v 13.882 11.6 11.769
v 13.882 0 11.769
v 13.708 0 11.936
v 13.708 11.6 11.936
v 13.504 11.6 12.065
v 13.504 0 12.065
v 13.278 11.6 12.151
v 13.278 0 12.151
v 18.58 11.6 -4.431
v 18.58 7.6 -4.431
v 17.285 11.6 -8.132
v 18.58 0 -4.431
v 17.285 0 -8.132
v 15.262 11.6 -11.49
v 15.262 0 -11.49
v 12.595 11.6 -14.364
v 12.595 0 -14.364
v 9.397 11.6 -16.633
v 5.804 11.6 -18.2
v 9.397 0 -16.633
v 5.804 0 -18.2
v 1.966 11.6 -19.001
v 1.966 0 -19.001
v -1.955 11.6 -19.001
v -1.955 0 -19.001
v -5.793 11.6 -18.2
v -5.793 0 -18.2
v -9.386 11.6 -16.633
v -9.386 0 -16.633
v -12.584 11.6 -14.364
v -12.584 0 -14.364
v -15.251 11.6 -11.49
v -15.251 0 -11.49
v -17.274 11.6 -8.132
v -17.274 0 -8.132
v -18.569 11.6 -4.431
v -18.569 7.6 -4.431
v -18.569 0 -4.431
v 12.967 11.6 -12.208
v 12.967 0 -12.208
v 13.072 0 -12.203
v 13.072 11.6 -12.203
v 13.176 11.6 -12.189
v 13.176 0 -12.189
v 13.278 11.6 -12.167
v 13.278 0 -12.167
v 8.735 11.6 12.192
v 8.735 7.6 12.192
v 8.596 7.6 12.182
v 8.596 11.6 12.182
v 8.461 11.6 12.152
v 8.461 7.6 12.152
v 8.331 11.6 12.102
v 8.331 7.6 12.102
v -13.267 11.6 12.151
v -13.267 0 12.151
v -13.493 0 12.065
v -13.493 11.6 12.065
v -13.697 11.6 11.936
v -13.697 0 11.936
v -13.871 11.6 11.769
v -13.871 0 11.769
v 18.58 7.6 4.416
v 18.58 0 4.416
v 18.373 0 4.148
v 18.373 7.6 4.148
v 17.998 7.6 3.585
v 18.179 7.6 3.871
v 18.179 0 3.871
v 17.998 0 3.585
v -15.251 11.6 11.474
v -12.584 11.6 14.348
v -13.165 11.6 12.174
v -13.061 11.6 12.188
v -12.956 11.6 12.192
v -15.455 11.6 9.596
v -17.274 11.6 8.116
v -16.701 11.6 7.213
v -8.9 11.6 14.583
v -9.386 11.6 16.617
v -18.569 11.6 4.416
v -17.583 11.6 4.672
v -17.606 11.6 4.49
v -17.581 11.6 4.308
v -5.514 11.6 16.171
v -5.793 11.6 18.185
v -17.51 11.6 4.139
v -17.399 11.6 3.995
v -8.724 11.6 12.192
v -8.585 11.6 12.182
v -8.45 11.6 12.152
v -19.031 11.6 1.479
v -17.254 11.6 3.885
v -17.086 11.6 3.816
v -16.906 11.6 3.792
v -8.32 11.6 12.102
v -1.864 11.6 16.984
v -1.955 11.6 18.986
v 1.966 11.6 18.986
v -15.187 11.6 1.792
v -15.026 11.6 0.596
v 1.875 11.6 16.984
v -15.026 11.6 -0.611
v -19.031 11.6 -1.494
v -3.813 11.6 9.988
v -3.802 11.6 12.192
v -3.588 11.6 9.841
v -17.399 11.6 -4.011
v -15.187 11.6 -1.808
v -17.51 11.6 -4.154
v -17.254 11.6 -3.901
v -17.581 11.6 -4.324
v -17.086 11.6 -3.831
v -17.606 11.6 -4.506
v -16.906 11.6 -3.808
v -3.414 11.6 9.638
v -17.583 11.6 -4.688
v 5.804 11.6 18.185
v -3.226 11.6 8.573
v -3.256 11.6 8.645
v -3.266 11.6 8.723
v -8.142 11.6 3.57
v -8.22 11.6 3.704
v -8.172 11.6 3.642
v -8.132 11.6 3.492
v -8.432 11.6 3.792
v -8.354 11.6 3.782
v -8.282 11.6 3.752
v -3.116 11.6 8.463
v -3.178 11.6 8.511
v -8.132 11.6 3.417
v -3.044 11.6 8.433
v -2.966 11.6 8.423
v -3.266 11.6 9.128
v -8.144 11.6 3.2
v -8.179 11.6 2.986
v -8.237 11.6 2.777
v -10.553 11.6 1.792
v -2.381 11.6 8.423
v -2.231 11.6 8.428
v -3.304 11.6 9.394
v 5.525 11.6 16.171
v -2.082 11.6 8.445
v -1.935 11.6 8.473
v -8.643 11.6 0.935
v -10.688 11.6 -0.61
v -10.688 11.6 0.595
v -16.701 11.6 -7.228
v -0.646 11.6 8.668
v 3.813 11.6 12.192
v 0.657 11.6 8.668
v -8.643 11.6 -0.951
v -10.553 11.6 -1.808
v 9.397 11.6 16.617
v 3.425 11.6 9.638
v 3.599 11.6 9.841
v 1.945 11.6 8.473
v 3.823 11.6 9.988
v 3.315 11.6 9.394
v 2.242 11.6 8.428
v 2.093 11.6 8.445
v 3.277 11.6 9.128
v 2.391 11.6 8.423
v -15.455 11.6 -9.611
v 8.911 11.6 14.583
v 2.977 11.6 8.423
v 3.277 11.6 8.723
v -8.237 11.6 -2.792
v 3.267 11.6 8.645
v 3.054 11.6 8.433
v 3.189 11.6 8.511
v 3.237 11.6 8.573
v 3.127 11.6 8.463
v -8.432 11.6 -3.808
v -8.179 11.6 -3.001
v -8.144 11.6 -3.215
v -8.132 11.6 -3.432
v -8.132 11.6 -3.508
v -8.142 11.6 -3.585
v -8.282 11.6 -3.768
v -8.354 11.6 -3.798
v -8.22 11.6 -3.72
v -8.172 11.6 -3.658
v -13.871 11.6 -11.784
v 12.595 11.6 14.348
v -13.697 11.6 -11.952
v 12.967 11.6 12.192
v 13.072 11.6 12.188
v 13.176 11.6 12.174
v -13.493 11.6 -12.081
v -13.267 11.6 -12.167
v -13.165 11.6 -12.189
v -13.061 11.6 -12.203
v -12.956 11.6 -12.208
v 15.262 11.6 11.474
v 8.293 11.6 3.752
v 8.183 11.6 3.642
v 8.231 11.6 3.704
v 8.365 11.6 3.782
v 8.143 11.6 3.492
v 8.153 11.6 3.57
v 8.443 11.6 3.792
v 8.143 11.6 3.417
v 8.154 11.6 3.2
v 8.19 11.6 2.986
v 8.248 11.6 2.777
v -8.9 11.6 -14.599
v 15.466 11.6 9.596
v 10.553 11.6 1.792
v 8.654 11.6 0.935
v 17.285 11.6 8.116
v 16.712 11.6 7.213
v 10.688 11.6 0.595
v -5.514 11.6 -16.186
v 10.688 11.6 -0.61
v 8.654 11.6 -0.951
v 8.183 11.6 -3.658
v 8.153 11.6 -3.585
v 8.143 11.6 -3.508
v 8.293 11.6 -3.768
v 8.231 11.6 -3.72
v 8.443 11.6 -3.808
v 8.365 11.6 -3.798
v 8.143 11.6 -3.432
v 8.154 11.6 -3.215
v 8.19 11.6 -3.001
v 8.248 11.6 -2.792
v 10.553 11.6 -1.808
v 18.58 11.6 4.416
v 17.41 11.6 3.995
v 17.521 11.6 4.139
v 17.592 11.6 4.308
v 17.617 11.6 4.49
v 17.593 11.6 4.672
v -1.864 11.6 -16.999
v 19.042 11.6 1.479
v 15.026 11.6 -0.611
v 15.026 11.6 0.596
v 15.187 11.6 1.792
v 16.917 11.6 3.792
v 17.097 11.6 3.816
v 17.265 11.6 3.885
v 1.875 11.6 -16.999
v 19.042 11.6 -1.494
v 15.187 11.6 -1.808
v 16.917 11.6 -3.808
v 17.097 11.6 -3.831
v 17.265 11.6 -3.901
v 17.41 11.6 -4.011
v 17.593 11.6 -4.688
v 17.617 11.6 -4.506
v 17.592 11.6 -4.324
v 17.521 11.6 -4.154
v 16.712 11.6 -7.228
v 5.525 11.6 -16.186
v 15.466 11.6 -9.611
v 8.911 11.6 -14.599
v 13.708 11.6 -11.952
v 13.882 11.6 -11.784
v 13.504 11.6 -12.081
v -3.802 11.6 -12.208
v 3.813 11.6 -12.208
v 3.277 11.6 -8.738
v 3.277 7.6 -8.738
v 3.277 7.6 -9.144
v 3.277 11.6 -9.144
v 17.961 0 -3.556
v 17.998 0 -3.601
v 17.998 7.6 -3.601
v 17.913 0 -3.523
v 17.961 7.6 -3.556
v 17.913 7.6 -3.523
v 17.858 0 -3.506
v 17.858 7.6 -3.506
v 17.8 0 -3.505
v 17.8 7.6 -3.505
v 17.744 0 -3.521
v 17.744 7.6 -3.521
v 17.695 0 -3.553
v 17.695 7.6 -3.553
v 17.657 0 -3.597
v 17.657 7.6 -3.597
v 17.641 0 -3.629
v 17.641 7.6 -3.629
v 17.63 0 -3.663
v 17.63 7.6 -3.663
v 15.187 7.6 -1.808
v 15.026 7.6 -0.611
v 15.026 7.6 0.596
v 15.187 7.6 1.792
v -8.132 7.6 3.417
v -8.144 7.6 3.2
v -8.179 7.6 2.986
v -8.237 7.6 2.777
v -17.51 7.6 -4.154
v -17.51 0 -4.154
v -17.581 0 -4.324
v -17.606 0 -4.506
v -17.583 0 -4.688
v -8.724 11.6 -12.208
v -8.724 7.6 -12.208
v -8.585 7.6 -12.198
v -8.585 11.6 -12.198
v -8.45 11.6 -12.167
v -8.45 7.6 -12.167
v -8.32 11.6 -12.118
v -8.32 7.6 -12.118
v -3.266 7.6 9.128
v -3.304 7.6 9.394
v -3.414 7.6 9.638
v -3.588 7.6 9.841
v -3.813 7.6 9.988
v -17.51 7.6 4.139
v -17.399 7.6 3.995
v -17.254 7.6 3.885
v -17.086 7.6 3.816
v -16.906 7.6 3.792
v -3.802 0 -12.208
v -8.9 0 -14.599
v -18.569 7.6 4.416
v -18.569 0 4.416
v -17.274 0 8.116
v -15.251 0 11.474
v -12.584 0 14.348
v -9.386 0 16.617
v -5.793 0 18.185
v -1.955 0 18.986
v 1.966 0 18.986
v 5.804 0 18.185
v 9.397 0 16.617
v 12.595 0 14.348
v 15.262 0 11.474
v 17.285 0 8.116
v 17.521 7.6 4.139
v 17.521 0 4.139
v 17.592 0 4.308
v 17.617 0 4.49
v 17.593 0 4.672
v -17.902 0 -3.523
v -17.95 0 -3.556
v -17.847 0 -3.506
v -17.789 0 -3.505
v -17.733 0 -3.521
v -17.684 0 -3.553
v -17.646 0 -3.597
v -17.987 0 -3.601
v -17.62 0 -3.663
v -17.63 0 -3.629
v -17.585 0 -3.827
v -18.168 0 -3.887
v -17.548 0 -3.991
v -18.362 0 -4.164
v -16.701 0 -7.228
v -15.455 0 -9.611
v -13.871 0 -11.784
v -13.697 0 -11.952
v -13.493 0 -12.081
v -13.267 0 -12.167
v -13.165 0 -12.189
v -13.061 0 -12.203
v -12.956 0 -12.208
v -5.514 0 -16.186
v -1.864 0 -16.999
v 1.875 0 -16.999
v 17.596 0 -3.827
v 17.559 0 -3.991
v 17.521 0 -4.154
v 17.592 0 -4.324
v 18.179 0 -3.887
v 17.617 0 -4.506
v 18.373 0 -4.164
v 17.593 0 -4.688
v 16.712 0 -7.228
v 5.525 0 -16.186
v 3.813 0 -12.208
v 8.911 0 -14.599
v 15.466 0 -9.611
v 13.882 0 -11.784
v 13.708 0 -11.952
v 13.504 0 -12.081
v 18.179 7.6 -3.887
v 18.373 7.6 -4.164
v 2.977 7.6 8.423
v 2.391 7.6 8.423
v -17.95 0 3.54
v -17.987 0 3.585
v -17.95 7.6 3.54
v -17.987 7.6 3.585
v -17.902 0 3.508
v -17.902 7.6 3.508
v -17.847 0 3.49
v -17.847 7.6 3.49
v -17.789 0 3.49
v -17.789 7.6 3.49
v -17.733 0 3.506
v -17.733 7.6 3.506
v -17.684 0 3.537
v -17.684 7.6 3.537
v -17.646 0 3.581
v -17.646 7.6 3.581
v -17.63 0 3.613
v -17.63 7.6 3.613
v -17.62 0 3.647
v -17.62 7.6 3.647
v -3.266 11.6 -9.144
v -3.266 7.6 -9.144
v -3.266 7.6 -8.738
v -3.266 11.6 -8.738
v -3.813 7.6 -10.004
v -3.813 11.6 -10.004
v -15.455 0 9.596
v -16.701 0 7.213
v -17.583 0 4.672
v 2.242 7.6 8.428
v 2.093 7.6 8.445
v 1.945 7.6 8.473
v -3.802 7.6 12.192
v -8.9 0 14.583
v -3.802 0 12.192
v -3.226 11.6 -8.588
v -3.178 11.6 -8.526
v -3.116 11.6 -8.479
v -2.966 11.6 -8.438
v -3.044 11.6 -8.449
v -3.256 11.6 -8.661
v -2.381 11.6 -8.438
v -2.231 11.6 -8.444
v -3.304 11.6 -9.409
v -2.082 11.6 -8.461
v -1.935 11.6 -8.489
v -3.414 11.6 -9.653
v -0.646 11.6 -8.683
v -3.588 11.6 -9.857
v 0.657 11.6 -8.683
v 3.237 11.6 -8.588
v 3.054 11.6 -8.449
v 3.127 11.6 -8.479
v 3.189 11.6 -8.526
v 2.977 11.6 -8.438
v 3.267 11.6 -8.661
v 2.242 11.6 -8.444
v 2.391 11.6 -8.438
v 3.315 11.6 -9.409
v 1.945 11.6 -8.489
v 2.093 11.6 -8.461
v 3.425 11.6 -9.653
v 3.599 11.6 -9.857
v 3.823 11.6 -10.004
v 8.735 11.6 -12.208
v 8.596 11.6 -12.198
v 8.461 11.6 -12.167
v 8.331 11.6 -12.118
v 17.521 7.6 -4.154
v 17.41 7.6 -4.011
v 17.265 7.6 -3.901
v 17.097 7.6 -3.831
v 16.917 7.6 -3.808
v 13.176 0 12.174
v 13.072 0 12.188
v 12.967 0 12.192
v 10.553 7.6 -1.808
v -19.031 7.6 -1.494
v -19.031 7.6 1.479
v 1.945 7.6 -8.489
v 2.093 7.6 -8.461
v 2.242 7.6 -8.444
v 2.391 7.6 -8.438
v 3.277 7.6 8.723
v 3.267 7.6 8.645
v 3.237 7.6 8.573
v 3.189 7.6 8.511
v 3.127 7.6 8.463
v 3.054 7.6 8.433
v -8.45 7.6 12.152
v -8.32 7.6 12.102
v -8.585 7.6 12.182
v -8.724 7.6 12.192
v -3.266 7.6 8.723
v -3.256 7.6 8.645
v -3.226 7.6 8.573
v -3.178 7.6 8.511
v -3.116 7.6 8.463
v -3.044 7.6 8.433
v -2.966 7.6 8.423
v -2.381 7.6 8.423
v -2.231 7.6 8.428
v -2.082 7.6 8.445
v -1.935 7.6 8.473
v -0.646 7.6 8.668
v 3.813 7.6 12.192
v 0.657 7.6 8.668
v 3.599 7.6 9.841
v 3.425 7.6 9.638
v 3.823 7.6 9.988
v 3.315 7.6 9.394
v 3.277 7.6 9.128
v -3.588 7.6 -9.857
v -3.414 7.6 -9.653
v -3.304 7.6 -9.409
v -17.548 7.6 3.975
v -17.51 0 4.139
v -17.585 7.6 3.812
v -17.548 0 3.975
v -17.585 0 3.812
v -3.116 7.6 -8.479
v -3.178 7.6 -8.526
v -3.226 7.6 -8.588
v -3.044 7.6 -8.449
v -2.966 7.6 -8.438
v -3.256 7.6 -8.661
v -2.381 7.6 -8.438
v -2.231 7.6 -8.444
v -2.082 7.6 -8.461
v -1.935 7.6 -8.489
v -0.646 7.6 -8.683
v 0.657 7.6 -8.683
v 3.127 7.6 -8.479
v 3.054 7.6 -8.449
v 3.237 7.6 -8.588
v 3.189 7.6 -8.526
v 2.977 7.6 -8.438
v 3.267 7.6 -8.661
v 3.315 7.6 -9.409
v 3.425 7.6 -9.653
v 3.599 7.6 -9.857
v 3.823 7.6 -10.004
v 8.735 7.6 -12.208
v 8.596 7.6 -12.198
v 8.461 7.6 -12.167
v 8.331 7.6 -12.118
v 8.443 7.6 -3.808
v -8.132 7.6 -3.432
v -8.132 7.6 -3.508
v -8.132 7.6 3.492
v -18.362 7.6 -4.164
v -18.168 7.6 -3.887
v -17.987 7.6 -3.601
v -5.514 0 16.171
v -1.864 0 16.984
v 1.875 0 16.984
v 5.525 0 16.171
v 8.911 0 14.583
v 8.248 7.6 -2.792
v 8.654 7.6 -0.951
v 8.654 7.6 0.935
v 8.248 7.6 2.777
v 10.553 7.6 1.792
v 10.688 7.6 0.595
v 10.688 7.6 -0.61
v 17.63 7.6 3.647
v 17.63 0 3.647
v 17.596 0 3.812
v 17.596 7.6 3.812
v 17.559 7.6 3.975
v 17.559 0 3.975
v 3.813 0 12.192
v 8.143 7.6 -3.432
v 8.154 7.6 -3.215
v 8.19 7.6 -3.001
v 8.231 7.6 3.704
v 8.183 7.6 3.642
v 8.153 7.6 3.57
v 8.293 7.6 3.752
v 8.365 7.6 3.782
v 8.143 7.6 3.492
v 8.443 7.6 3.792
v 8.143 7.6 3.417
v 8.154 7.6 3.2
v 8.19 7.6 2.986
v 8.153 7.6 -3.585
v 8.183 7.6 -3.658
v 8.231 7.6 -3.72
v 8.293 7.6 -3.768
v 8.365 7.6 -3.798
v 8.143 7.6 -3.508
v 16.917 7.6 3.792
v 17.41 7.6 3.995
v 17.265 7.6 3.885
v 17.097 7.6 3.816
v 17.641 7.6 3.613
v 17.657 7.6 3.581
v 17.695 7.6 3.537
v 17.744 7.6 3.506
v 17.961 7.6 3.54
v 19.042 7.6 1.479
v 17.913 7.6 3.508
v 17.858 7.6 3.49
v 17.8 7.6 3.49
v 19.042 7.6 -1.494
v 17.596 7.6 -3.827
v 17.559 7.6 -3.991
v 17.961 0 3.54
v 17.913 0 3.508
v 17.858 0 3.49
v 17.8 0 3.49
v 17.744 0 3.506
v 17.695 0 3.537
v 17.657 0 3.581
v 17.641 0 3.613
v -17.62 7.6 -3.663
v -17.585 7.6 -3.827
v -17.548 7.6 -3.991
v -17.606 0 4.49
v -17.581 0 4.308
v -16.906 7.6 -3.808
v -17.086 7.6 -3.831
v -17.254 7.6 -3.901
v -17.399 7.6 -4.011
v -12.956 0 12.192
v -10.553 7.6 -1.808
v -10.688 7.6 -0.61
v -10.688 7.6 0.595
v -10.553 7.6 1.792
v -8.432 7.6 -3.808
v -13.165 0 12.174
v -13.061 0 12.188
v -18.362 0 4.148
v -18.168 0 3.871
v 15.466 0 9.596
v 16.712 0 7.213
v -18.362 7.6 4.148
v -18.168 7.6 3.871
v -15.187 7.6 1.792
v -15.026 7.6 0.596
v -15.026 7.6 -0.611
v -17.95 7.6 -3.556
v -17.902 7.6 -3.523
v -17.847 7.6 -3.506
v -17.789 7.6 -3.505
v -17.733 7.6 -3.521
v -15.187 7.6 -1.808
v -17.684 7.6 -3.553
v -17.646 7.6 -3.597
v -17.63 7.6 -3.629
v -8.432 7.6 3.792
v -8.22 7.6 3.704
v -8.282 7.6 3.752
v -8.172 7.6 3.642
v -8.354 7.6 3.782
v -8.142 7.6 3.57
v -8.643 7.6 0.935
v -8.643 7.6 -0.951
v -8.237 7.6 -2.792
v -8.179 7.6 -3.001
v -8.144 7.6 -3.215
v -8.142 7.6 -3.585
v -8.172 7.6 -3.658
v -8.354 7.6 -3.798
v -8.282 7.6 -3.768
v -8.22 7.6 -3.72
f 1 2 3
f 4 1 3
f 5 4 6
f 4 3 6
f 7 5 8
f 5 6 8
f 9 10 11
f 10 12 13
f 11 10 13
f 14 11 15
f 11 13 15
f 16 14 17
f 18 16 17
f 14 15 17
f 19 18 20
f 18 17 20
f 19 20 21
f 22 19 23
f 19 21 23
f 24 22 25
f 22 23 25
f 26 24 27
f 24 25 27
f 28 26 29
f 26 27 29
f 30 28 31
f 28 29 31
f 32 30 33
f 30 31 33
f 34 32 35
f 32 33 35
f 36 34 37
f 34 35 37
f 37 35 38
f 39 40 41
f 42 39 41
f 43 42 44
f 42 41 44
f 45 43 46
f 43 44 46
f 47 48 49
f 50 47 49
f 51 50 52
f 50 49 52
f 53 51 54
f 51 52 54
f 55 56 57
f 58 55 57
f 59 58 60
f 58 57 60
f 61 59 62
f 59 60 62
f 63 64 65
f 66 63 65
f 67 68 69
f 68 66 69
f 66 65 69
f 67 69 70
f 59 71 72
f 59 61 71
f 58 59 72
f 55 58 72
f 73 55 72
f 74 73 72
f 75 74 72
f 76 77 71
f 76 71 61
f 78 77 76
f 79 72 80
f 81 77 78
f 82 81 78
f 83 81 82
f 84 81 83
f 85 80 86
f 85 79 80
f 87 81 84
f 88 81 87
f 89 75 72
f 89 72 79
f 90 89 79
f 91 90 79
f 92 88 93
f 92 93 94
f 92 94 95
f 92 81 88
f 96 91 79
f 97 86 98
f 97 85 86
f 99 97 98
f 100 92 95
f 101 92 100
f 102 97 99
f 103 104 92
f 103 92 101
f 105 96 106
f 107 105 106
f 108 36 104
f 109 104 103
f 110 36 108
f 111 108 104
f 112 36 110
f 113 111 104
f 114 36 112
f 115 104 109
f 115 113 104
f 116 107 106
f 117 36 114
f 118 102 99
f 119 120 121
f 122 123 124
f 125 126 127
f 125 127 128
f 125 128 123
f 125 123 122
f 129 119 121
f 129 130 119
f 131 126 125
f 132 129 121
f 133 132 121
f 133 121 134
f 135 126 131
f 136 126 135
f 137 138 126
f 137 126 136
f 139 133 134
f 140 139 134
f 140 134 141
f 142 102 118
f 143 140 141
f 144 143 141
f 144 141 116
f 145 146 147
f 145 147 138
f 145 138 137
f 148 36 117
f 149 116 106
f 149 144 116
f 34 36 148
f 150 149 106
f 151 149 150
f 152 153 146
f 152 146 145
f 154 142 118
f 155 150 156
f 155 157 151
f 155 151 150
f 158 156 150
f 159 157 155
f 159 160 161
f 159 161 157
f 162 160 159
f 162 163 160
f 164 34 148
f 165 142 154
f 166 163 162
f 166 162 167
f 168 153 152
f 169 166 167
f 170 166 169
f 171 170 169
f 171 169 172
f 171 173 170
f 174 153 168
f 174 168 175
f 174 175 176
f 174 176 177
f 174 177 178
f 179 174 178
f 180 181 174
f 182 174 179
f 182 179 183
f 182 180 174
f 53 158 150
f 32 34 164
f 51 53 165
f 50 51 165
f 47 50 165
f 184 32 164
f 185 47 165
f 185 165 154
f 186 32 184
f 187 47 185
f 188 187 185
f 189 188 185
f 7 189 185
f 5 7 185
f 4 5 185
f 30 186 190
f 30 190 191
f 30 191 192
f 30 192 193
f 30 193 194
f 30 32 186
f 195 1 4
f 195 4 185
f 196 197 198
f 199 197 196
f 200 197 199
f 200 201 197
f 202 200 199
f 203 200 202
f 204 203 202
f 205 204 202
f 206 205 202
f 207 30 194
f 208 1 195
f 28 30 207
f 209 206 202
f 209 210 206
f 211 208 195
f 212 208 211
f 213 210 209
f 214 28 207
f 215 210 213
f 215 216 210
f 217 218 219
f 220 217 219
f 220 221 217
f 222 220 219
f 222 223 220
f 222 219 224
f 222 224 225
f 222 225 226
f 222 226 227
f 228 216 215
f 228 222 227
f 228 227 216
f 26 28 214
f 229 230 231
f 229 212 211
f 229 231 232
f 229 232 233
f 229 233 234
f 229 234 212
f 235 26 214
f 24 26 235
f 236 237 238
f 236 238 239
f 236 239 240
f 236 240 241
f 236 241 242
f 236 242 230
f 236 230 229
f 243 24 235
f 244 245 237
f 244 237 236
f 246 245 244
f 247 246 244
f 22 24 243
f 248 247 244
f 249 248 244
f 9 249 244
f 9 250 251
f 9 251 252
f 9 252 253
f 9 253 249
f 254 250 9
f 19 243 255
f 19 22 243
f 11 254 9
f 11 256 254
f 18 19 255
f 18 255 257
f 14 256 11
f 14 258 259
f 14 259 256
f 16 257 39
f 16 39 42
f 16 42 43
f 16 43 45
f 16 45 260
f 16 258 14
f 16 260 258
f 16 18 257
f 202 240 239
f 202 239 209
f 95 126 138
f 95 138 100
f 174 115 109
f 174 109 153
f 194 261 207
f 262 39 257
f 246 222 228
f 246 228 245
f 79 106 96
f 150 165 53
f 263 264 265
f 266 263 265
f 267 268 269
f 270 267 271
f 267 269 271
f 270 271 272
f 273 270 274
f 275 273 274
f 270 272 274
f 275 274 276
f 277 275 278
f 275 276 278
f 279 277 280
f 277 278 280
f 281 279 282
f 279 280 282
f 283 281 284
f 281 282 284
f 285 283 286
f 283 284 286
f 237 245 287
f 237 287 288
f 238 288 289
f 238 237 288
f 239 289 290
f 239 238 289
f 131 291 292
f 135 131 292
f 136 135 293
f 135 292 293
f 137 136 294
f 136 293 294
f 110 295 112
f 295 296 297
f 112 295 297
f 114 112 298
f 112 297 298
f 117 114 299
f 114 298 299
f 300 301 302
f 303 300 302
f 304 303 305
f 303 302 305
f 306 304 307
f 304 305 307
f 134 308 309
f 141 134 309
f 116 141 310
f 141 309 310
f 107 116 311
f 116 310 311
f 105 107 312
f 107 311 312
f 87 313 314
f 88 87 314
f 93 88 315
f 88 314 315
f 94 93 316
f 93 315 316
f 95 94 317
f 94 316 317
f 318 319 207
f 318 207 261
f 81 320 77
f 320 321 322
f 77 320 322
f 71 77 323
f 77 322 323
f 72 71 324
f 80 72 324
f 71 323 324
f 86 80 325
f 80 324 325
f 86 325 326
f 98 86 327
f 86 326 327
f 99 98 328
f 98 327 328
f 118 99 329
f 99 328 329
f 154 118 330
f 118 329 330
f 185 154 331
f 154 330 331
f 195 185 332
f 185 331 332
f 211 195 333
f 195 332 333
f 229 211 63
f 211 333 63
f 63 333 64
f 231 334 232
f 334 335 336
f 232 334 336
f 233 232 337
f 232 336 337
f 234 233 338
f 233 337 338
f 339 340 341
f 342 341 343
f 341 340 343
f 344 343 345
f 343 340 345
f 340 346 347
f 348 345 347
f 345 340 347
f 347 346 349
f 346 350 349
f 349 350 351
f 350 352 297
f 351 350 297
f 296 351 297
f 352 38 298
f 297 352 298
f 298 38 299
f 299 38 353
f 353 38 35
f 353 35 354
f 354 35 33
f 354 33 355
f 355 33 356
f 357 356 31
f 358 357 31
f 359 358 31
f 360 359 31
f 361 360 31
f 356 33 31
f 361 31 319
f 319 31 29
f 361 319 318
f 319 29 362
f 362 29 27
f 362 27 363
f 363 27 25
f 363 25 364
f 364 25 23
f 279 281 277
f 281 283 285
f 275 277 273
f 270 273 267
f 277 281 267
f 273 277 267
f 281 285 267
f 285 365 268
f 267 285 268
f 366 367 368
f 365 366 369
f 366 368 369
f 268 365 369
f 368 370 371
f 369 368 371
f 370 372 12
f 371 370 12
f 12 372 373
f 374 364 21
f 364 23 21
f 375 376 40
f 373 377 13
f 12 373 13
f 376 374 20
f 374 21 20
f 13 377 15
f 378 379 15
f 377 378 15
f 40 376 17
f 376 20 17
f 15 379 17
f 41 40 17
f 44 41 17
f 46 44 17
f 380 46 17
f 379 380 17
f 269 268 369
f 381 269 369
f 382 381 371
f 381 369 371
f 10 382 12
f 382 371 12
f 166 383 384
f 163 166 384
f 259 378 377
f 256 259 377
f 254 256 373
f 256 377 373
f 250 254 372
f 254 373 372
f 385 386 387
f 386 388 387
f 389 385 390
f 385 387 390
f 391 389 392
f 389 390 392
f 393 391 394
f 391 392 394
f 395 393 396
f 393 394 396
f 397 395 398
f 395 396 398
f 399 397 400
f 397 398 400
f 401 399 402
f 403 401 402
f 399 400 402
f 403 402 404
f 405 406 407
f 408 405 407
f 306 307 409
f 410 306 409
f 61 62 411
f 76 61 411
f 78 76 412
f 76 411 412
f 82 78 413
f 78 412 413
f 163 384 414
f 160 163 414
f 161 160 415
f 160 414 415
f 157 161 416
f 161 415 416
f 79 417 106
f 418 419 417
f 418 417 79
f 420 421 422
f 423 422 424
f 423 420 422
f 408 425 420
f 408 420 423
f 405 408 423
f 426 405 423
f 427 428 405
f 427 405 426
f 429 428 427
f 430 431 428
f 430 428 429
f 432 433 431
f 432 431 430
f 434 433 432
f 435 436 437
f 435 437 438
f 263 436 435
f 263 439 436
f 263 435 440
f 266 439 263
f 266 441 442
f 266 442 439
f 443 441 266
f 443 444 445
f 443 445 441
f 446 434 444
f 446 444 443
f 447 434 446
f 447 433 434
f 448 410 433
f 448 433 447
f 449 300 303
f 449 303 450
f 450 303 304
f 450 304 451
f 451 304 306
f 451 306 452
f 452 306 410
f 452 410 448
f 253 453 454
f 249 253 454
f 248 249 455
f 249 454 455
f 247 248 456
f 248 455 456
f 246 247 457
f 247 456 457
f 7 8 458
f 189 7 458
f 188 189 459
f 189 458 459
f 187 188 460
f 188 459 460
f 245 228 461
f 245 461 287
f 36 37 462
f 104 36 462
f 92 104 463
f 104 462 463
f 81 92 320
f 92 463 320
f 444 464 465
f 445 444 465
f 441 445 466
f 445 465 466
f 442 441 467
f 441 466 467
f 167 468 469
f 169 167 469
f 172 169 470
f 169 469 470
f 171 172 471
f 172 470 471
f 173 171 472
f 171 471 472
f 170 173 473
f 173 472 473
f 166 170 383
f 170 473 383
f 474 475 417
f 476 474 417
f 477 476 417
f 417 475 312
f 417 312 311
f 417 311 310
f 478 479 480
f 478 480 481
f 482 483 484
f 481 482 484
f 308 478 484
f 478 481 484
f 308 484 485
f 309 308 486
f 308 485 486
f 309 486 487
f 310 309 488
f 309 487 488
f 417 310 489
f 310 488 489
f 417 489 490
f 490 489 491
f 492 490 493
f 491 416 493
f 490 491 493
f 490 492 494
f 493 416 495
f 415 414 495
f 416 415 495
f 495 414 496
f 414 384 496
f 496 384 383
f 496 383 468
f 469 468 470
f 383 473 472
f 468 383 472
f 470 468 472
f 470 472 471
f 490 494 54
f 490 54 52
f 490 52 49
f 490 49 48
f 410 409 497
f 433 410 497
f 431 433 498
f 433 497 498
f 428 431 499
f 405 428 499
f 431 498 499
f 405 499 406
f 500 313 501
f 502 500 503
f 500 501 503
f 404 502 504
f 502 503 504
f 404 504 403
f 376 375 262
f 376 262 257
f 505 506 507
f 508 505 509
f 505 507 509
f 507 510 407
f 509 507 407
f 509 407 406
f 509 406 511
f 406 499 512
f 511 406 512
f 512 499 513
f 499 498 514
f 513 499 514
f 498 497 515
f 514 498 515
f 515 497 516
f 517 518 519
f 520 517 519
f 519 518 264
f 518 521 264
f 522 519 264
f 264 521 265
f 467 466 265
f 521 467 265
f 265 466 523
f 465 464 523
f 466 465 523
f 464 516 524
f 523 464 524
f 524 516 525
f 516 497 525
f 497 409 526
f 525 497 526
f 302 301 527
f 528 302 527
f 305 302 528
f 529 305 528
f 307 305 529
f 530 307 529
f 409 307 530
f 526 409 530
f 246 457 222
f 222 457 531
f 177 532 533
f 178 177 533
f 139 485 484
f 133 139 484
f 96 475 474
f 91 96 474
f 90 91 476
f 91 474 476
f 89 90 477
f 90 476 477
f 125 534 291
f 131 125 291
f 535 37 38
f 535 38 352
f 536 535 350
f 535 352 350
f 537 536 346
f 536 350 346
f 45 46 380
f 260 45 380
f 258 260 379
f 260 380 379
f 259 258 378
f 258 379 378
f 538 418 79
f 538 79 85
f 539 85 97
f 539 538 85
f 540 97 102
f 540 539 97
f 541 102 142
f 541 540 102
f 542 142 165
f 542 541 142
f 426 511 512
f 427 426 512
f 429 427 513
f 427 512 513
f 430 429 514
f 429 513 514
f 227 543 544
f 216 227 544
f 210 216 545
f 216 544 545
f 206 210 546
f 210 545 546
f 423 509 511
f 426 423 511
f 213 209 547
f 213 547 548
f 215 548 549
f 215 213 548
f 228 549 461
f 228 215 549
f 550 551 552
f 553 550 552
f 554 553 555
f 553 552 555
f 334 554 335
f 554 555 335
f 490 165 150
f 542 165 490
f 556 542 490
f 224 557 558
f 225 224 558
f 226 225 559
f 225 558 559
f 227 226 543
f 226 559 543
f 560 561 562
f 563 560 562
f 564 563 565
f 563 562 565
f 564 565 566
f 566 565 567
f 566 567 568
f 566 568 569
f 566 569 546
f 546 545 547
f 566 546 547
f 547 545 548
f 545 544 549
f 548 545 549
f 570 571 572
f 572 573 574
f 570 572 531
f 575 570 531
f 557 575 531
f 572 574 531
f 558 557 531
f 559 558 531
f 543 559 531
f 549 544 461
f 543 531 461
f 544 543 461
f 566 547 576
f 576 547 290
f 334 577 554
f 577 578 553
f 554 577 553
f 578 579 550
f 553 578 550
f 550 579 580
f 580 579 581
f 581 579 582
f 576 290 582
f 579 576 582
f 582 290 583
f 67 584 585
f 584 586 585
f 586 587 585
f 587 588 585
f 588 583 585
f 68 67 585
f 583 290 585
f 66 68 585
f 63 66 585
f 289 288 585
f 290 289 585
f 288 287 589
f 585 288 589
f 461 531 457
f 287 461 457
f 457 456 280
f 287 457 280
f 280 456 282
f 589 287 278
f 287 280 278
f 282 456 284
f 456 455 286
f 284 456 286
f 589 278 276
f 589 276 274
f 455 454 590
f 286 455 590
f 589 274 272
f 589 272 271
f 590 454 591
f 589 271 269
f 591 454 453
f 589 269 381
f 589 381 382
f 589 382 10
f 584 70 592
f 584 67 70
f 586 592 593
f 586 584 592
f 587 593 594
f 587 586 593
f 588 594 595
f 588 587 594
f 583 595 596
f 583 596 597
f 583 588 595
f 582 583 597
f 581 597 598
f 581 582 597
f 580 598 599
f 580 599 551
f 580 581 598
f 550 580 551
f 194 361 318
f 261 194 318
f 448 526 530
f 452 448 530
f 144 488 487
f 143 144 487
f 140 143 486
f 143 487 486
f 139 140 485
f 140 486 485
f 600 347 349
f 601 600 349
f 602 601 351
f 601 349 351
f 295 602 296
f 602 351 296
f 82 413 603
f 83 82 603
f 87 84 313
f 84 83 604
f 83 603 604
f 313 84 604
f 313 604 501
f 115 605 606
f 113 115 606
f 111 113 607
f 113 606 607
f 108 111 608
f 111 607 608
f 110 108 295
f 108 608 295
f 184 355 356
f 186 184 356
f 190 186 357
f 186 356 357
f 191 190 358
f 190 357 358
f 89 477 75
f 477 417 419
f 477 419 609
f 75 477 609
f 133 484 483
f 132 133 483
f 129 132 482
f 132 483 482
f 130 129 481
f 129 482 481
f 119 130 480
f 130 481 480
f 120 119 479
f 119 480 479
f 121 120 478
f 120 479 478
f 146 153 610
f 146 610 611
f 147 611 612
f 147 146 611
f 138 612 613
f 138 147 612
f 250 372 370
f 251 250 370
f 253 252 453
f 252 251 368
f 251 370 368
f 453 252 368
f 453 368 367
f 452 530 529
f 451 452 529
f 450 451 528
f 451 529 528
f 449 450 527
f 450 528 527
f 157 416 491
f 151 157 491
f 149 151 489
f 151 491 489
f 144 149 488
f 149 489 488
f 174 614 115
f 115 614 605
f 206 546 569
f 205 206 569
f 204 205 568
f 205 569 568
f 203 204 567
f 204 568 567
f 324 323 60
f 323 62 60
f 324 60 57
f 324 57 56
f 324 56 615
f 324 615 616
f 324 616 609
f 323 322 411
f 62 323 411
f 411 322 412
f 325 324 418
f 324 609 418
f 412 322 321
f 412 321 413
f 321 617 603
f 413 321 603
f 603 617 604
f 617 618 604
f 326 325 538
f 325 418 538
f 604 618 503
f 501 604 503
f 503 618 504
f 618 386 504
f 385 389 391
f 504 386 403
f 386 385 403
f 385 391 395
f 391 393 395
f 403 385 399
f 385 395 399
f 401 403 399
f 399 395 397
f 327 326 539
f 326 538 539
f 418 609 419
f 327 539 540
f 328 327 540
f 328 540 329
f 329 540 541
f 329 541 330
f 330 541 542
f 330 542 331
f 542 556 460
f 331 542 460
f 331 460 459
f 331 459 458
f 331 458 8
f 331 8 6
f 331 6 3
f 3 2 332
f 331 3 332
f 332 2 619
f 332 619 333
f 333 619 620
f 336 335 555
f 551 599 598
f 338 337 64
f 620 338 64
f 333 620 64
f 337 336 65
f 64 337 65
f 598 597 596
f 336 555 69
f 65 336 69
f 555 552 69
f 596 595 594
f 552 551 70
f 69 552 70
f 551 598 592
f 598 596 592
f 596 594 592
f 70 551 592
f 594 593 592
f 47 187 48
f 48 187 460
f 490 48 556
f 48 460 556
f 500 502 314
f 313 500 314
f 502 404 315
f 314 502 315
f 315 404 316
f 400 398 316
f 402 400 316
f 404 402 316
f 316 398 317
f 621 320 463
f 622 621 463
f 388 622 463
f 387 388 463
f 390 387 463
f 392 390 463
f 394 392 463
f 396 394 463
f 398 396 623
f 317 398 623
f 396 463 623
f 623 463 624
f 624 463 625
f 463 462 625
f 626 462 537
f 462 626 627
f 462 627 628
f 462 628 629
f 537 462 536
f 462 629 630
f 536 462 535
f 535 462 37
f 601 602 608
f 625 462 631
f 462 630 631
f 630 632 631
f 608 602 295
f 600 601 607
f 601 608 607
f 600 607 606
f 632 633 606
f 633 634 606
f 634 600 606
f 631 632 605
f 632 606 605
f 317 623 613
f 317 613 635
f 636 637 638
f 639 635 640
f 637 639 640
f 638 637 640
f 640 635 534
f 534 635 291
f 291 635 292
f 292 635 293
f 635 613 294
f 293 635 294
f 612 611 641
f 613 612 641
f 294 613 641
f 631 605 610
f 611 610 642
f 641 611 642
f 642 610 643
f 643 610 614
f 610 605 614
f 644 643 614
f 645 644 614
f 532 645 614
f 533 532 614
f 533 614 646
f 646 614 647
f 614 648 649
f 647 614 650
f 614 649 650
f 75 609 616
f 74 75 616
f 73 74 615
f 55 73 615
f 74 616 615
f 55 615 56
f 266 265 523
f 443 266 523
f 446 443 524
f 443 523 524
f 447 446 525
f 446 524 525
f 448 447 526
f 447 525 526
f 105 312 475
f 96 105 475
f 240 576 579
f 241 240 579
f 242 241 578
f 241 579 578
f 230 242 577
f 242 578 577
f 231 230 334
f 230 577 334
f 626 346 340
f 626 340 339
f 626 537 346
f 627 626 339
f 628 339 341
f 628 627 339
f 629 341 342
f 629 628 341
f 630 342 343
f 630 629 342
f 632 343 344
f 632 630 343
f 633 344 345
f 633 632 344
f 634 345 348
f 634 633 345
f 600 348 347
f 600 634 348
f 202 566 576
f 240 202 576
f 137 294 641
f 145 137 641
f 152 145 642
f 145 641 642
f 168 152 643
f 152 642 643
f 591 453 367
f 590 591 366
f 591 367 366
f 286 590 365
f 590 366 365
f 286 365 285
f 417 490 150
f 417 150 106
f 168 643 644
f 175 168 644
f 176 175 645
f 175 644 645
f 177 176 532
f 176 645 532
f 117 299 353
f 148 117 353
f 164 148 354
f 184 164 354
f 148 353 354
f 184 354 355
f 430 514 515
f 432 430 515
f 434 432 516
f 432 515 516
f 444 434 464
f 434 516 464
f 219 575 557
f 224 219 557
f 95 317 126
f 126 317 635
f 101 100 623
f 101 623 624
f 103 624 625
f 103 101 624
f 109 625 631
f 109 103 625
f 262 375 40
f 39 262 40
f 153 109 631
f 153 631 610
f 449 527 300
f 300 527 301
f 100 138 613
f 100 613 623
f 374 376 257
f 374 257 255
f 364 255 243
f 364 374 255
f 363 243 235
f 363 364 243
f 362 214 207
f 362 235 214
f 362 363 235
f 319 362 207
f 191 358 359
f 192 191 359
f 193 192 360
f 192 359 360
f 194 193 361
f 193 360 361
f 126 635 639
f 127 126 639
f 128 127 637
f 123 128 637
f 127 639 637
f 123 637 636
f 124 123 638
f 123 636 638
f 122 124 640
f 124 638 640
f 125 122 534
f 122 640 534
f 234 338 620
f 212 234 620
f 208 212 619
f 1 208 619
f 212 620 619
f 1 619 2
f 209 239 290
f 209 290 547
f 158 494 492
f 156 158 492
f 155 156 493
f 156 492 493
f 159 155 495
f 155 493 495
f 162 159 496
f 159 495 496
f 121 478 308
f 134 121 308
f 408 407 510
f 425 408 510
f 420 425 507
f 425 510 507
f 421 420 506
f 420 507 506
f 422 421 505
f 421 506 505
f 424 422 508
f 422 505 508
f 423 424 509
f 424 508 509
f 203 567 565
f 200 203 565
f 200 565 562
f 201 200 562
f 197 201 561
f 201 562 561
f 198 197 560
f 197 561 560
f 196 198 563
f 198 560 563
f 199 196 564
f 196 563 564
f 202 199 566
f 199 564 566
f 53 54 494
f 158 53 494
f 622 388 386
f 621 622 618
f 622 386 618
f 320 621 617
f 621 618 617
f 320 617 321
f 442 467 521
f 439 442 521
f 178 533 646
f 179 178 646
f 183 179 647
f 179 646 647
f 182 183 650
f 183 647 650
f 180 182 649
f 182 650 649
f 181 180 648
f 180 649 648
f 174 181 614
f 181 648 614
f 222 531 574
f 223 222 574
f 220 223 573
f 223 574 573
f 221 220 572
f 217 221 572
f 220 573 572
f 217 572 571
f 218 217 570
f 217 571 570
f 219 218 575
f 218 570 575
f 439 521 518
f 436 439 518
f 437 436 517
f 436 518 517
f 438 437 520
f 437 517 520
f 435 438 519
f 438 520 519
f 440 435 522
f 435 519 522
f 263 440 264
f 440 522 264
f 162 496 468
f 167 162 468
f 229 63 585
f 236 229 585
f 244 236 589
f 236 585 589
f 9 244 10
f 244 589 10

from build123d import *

# Parameters (mm, degrees)
BOSS_EXTRUDE3_DEPTH     = 11.6
BOSS_EXTRUDE4_START     = 7.6
BOSS_EXTRUDE4_DEPTH     = 4
BOSS_EXTRUDE4_2_DEPTH   = 4
BOSS_EXTRUDE5_START     = 7.6
BOSS_EXTRUDE5_DEPTH     = 4
CUT_EXTRUDE2_DEPTH      = 30.063300051
CUT_EXTRUDE2_DEPTH_BACK = 30.063300051
CUT_EXTRUDE3_DEPTH      = 4
BOSS_EXTRUDE7_START     = -4
BOSS_EXTRUDE7_DEPTH     = 4
FILLET2_R               = 0.2


# Read off the part's stored shape, not the designer's step: Boss-Extrude4
with BuildPart() as part:
    # Sketch1 → Boss-Extrude3 (new body)
    with BuildSketch(Plane(origin=(0, 0, 0), x_dir=(1, 0, 0), z_dir=(0, 1, 0))):
        with BuildLine():
            ThreePointArc((-17.58254737, -4.672242255), (-17.599765659, -4.398388566), (-17.51039467, -4.138956227))
            ThreePointArc((-17.51039467, -4.138956227), (-17.599328192, -3.743486895), (-17.679334072, -3.346115252))
            ThreePointArc((-17.679334072, -3.346115252), (-17.701943431, -3.224620591), (-17.72371813, -3.102973568))
            ThreePointArc((-17.72371813, -3.102973568), (-18.10982994, -3.783027476), (-18.569387356, -4.415769626))
            ThreePointArc((-18.569387356, -4.415769626), (0.005448536, -19.086537812), (18.580284429, -4.415769626))
            ThreePointArc((18.580284429, -4.415769626), (18.120727013, -3.783027476), (17.734615203, -3.102973568))
            ThreePointArc((17.734615203, -3.102973568), (17.712840504, -3.224620591), (17.690231145, -3.346115252))
            ThreePointArc((17.690231145, -3.346115252), (17.610225265, -3.743486895), (17.521291743, -4.138956227))
            ThreePointArc((17.521291743, -4.138956227), (17.610662732, -4.398388566), (17.593444443, -4.672242255))
            ThreePointArc((17.593444443, -4.672242255), (16.132822021, -8.427159236), (13.881858032, -11.768712843))
            ThreePointArc((13.881858032, -11.768712843), (13.609040764, -12.005994533), (13.277928812, -12.151241693))
            ThreePointArc((13.277928812, -12.151241693), (0.005448536, -17.992242255), (-13.267031739, -12.151241693))
            ThreePointArc((-13.267031739, -12.151241693), (-13.598143691, -12.005994533), (-13.870960959, -11.768712843))
            ThreePointArc((-13.870960959, -11.768712843), (-16.121924949, -8.427159236), (-17.58254737, -4.672242255))
        make_face()
        with BuildLine():
            ThreePointArc((-17.679334072, 3.361630743), (-17.599328192, 3.759002385), (-17.51039467, 4.154471717))
            ThreePointArc((-17.51039467, 4.154471717), (-17.599765659, 4.413904056), (-17.58254737, 4.687757745))
            ThreePointArc((-17.58254737, 4.687757745), (-16.121924949, 8.442674726), (-13.870960959, 11.784228333))
            ThreePointArc((-13.870960959, 11.784228333), (-13.598143691, 12.021510023), (-13.267031739, 12.166757183))
            ThreePointArc((-13.267031739, 12.166757183), (0.005448536, 18.007757745), (13.277928812, 12.166757183))
            ThreePointArc((13.277928812, 12.166757183), (13.609040764, 12.021510023), (13.881858032, 11.784228333))
            ThreePointArc((13.881858032, 11.784228333), (16.132822021, 8.442674726), (17.593444443, 4.687757745))
            ThreePointArc((17.593444443, 4.687757745), (17.610662732, 4.413904056), (17.521291743, 4.154471717))
            ThreePointArc((17.521291743, 4.154471717), (17.610225265, 3.759002385), (17.690231145, 3.361630743))
            ThreePointArc((17.690231145, 3.361630743), (17.712840504, 3.240136082), (17.734615203, 3.118489059))
            ThreePointArc((17.734615203, 3.118489059), (18.120727013, 3.798542966), (18.580284429, 4.431285117))
            ThreePointArc((18.580284429, 4.431285117), (0.005448536, 19.102053303), (-18.569387356, 4.431285117))
            ThreePointArc((-18.569387356, 4.431285117), (-18.10982994, 3.798542966), (-17.72371813, 3.118489059))
            ThreePointArc((-17.72371813, 3.118489059), (-17.701943431, 3.240136082), (-17.679334072, 3.361630743))
        make_face()
        with BuildLine():
            ThreePointArc((13.277928812, 12.166757183), (0.005448536, 18.007757745), (-13.267031739, 12.166757183))
            ThreePointArc((-13.267031739, 12.166757183), (-13.112877807, 12.197463449), (-12.95603286, 12.207757745))
            Line((-12.95603286, 12.207757745), (-12.242000178, 12.207757745))
            Line((-12.242000178, 12.207757745), (-8.72365395, 12.207757745))
            Line((-8.72365395, 12.207757745), (8.734551023, 12.207757745))
            Line((8.734551023, 12.207757745), (12.25289725, 12.207757745))
            Line((12.25289725, 12.207757745), (12.966929933, 12.207757745))
            ThreePointArc((12.966929933, 12.207757745), (13.123774879, 12.197463449), (13.277928812, 12.166757183))
        make_face()
        with BuildLine():
            ThreePointArc((-12.95603286, -12.192242255), (-13.112877807, -12.181947959), (-13.267031739, -12.151241693))
            ThreePointArc((-13.267031739, -12.151241693), (0.005448536, -17.992242255), (13.277928812, -12.151241693))
            ThreePointArc((13.277928812, -12.151241693), (13.123774879, -12.181947959), (12.966929933, -12.192242255))
            Line((12.966929933, -12.192242255), (12.25289725, -12.192242255))
            Line((12.25289725, -12.192242255), (8.734551023, -12.192242255))
            Line((8.734551023, -12.192242255), (-8.72365395, -12.192242255))
            Line((-8.72365395, -12.192242255), (-12.242000178, -12.192242255))
            Line((-12.242000178, -12.192242255), (-12.95603286, -12.192242255))
        make_face()
    extrude(amount=BOSS_EXTRUDE3_DEPTH)

    # Boss-Extrude4 2 outline → Boss-Extrude4 2 (add)
    with BuildSketch(Plane(origin=(0, 0, 0), x_dir=(1, 0, 0), z_dir=(0, 1, 0)).offset(BOSS_EXTRUDE4_START)):
        with BuildLine():
            Line((3.276809518, -9.128196989), (3.276809518, -8.722832237))
            ThreePointArc((3.276809518, -8.722832237), (3.188941552, -8.510700203), (2.976809518, -8.422832237))
            Line((2.976809518, -8.422832237), (2.391405915, -8.422832237))
            ThreePointArc((2.391405915, -8.422832237), (2.167002233, -8.435461364), (1.945432574, -8.47318925))
            ThreePointArc((1.945432574, -8.47318925), (0.005448536, -8.692242255), (-1.934535501, -8.47318925))
            ThreePointArc((-1.934535501, -8.47318925), (-2.156105161, -8.435461364), (-2.380508843, -8.422832237))
            Line((-2.380508843, -8.422832237), (-2.965912445, -8.422832237))
            ThreePointArc((-2.965912445, -8.422832237), (-3.178044479, -8.510700203), (-3.265912445, -8.722832237))
            Line((-3.265912445, -8.722832237), (-3.265912445, -9.128196989))
            ThreePointArc((-3.265912445, -9.128196989), (-3.414131198, -9.637752512), (-3.812537354, -9.988306595))
            Line((-3.812537354, -9.988306595), (-8.320278858, -12.102351861))
            ThreePointArc((-8.320278858, -12.102351861), (-8.517019159, -12.169497378), (-8.72365395, -12.192242255))
            Line((-8.72365395, -12.192242255), (8.734551023, -12.192242255))
            ThreePointArc((8.734551023, -12.192242255), (8.527916232, -12.169497378), (8.331175931, -12.102351861))
            Line((8.331175931, -12.102351861), (3.823434427, -9.988306595))
            ThreePointArc((3.823434427, -9.988306595), (3.425028271, -9.637752512), (3.276809518, -9.128196989))
        make_face()
    extrude(amount=BOSS_EXTRUDE4_2_DEPTH)

    # Sketch1<9> → Boss-Extrude5 (add)
    with BuildSketch(Plane(origin=(0, 0, 0), x_dir=(1, 0, 0), z_dir=(0, 1, 0)).offset(BOSS_EXTRUDE5_START)):
        with BuildLine():
            Line((-8.131805397, -3.492242255), (-8.131805397, -3.41657908))
            ThreePointArc((-8.131805397, -3.41657908), (-8.15827713, -3.092254889), (-8.236991578, -2.776516122))
            ThreePointArc((-8.236991578, -2.776516122), (-8.694551464, 0.007757745), (-8.236991578, 2.792031613))
            ThreePointArc((-8.236991578, 2.792031613), (-8.15827713, 3.10777038), (-8.131805397, 3.432094571))
            Line((-8.131805397, 3.432094571), (-8.131805397, 3.507757745))
            ThreePointArc((-8.131805397, 3.507757745), (-8.219673362, 3.71988978), (-8.431805397, 3.807757745))
            Line((-8.431805397, 3.807757745), (-16.906085989, 3.807757745))
            ThreePointArc((-16.906085989, 3.807757745), (-17.2544391, 3.900592109), (-17.51039467, 4.154471717))
            ThreePointArc((-17.51039467, 4.154471717), (-17.624667608, 3.638047643), (-17.72371813, 3.118489059))
            ThreePointArc((-17.72371813, 3.118489059), (-16.994551464, 0.007757745), (-17.72371813, -3.102973568))
            ThreePointArc((-17.72371813, -3.102973568), (-17.624667608, -3.622532153), (-17.51039467, -4.138956227))
            ThreePointArc((-17.51039467, -4.138956227), (-17.2544391, -3.885076619), (-16.906085989, -3.792242255))
            Line((-16.906085989, -3.792242255), (-8.431805397, -3.792242255))
            ThreePointArc((-8.431805397, -3.792242255), (-8.219673362, -3.704374289), (-8.131805397, -3.492242255))
        make_face()
        with BuildLine():
            ThreePointArc((16.916983062, -3.792242255), (17.265336173, -3.885076619), (17.521291743, -4.138956227))
            ThreePointArc((17.521291743, -4.138956227), (17.635564681, -3.622532153), (17.734615203, -3.102973568))
            ThreePointArc((17.734615203, -3.102973568), (17.005448536, 0.007757745), (17.734615203, 3.118489059))
            ThreePointArc((17.734615203, 3.118489059), (17.635564681, 3.638047643), (17.521291743, 4.154471717))
            ThreePointArc((17.521291743, 4.154471717), (17.265336173, 3.900592109), (16.916983062, 3.807757745))
            Line((16.916983062, 3.807757745), (8.44270247, 3.807757745))
            ThreePointArc((8.44270247, 3.807757745), (8.230570435, 3.71988978), (8.14270247, 3.507757745))
            Line((8.14270247, 3.507757745), (8.14270247, 3.432094571))
            ThreePointArc((8.14270247, 3.432094571), (8.169174203, 3.10777038), (8.24788865, 2.792031613))
            ThreePointArc((8.24788865, 2.792031613), (8.705448536, 0.007757745), (8.24788865, -2.776516122))
            ThreePointArc((8.24788865, -2.776516122), (8.169174203, -3.092254889), (8.14270247, -3.41657908))
            Line((8.14270247, -3.41657908), (8.14270247, -3.492242255))
            ThreePointArc((8.14270247, -3.492242255), (8.230570435, -3.704374289), (8.44270247, -3.792242255))
            Line((8.44270247, -3.792242255), (16.916983062, -3.792242255))
        make_face()
    extrude(amount=BOSS_EXTRUDE5_DEPTH)

    # Sketch2 → Cut-Extrude2 (cut, two sides: drawn at the far end of the back side and taken through both)
    with BuildSketch(Plane(origin=(0, 11.6, 0), x_dir=(1, 0, 0), z_dir=(0, 1, 0)).offset(-CUT_EXTRUDE2_DEPTH_BACK)):
        with BuildLine():
            Line((-8.900330018, 14.598921131), (-3.801694427, 12.207757745))
            Line((-3.801694427, 12.207757745), (3.812591499, 12.207757745))
            Line((3.812591499, 12.207757745), (8.911227091, 14.598921131))
            ThreePointArc((8.911227091, 14.598921131), (0.005448536, 17.102053303), (-8.900330018, 14.598921131))
        make_face()
        with BuildLine():
            Line((-3.801694427, -12.192242255), (-8.900330018, -14.58340564))
            ThreePointArc((-8.900330018, -14.58340564), (0.005448536, -17.086537812), (8.911227091, -14.58340564))
            Line((8.911227091, -14.58340564), (3.812591499, -12.192242255))
            Line((3.812591499, -12.192242255), (-3.801694427, -12.192242255))
        make_face()
    extrude(amount=CUT_EXTRUDE2_DEPTH + CUT_EXTRUDE2_DEPTH_BACK, mode=Mode.SUBTRACT)

    # Sketch3 → Cut-Extrude3 (cut)
    with BuildSketch(Plane(origin=(0, 11.6, 0), x_dir=(1, 0, 0), z_dir=(0, 1, 0))):
        with BuildLine():
            Line((-15.187285462, 1.807757745), (-10.552960091, 1.807757745))
            ThreePointArc((-10.552960091, 1.807757745), (-10.705448536, 0.007757745), (-10.552960091, -1.792242255))
            Line((-10.552960091, -1.792242255), (-15.187285462, -1.792242255))
            ThreePointArc((-15.187285462, -1.792242255), (-15.005448536, 0.007757745), (-15.187285462, 1.807757745))
        make_face()
        with BuildLine():
            ThreePointArc((10.552960091, -1.792242255), (10.705448536, 0.007757745), (10.552960091, 1.807757745))
            Line((10.552960091, 1.807757745), (15.187285462, 1.807757745))
            ThreePointArc((15.187285462, 1.807757745), (15.005448536, 0.007757745), (15.187285462, -1.792242255))
            Line((15.187285462, -1.792242255), (10.552960091, -1.792242255))
        make_face()
    extrude(amount=-CUT_EXTRUDE3_DEPTH, mode=Mode.SUBTRACT)

    # Sketch6 → Boss-Extrude7 (add)
    with BuildSketch(Plane(origin=(0, 11.6, 0), x_dir=(1, 0, 0), z_dir=(0, 1, 0)).offset(BOSS_EXTRUDE7_START)):
        with BuildLine():
            ThreePointArc((-18.569387356, 4.431285117), (-19.088847021, 0.007757745), (-18.569387356, -4.415769626))
            ThreePointArc((-18.569387356, -4.415769626), (-16.994551464, 0.007757745), (-18.569387356, 4.431285117))
        make_face()
        with BuildLine():
            ThreePointArc((18.580284429, -4.415769626), (19.099744094, 0.007757745), (18.580284429, 4.431285117))
            ThreePointArc((18.580284429, 4.431285117), (17.005448536, 0.007757745), (18.580284429, -4.415769626))
        make_face()
    extrude(amount=BOSS_EXTRUDE7_DEPTH)

    # Fillet2
    fillet2_edges = [part.edges().sort_by_distance(p)[0] for p in [
        (-17.72371813, 3.8, 3.102973568),
        (-17.72371813, 3.8, -3.118489059),
        (17.734615203, 3.8, -3.118489059),
        (17.734615203, 3.8, 3.102973568),
    ]]
    fillet(fillet2_edges, radius=FILLET2_R)


with BuildPart() as body_2:
    # Boss-Extrude4 outline → Boss-Extrude4 (new body)
    with BuildSketch(Plane(origin=(0, 0, 0), x_dir=(1, 0, 0), z_dir=(0, 1, 0)).offset(BOSS_EXTRUDE4_START)):
        with BuildLine():
            ThreePointArc((-3.812537354, 10.003822086), (-3.414131198, 9.653268002), (-3.265912445, 9.143712479))
            Line((-3.265912445, 9.143712479), (-3.265912445, 8.738347728))
            ThreePointArc((-3.265912445, 8.738347728), (-3.17804448, 8.526215693), (-2.965912445, 8.438347728))
            Line((-2.965912445, 8.438347728), (-2.380508843, 8.438347728))
            ThreePointArc((-2.380508843, 8.438347728), (-2.156105161, 8.450976855), (-1.934535501, 8.48870474))
            ThreePointArc((-1.934535501, 8.48870474), (0.005448536, 8.707757745), (1.945432574, 8.48870474))
            ThreePointArc((1.945432574, 8.48870474), (2.167002233, 8.450976855), (2.391405915, 8.438347728))
            Line((2.391405915, 8.438347728), (2.976809518, 8.438347728))
            ThreePointArc((2.976809518, 8.438347728), (3.188941553, 8.526215693), (3.276809518, 8.738347728))
            Line((3.276809518, 8.738347728), (3.276809518, 9.143712479))
            ThreePointArc((3.276809518, 9.143712479), (3.425028271, 9.653268002), (3.823434427, 10.003822086))
            Line((3.823434427, 10.003822086), (8.331175931, 12.117867352))
            ThreePointArc((8.331175931, 12.117867352), (8.527916232, 12.185012868), (8.734551023, 12.207757745))
            Line((8.734551023, 12.207757745), (-8.72365395, 12.207757745))
            ThreePointArc((-8.72365395, 12.207757745), (-8.517019159, 12.185012868), (-8.320278858, 12.117867352))
            Line((-8.320278858, 12.117867352), (-3.812537354, 10.003822086))
        make_face()
    extrude(amount=BOSS_EXTRUDE4_DEPTH)


solid = Compound([part.part, body_2.part])
